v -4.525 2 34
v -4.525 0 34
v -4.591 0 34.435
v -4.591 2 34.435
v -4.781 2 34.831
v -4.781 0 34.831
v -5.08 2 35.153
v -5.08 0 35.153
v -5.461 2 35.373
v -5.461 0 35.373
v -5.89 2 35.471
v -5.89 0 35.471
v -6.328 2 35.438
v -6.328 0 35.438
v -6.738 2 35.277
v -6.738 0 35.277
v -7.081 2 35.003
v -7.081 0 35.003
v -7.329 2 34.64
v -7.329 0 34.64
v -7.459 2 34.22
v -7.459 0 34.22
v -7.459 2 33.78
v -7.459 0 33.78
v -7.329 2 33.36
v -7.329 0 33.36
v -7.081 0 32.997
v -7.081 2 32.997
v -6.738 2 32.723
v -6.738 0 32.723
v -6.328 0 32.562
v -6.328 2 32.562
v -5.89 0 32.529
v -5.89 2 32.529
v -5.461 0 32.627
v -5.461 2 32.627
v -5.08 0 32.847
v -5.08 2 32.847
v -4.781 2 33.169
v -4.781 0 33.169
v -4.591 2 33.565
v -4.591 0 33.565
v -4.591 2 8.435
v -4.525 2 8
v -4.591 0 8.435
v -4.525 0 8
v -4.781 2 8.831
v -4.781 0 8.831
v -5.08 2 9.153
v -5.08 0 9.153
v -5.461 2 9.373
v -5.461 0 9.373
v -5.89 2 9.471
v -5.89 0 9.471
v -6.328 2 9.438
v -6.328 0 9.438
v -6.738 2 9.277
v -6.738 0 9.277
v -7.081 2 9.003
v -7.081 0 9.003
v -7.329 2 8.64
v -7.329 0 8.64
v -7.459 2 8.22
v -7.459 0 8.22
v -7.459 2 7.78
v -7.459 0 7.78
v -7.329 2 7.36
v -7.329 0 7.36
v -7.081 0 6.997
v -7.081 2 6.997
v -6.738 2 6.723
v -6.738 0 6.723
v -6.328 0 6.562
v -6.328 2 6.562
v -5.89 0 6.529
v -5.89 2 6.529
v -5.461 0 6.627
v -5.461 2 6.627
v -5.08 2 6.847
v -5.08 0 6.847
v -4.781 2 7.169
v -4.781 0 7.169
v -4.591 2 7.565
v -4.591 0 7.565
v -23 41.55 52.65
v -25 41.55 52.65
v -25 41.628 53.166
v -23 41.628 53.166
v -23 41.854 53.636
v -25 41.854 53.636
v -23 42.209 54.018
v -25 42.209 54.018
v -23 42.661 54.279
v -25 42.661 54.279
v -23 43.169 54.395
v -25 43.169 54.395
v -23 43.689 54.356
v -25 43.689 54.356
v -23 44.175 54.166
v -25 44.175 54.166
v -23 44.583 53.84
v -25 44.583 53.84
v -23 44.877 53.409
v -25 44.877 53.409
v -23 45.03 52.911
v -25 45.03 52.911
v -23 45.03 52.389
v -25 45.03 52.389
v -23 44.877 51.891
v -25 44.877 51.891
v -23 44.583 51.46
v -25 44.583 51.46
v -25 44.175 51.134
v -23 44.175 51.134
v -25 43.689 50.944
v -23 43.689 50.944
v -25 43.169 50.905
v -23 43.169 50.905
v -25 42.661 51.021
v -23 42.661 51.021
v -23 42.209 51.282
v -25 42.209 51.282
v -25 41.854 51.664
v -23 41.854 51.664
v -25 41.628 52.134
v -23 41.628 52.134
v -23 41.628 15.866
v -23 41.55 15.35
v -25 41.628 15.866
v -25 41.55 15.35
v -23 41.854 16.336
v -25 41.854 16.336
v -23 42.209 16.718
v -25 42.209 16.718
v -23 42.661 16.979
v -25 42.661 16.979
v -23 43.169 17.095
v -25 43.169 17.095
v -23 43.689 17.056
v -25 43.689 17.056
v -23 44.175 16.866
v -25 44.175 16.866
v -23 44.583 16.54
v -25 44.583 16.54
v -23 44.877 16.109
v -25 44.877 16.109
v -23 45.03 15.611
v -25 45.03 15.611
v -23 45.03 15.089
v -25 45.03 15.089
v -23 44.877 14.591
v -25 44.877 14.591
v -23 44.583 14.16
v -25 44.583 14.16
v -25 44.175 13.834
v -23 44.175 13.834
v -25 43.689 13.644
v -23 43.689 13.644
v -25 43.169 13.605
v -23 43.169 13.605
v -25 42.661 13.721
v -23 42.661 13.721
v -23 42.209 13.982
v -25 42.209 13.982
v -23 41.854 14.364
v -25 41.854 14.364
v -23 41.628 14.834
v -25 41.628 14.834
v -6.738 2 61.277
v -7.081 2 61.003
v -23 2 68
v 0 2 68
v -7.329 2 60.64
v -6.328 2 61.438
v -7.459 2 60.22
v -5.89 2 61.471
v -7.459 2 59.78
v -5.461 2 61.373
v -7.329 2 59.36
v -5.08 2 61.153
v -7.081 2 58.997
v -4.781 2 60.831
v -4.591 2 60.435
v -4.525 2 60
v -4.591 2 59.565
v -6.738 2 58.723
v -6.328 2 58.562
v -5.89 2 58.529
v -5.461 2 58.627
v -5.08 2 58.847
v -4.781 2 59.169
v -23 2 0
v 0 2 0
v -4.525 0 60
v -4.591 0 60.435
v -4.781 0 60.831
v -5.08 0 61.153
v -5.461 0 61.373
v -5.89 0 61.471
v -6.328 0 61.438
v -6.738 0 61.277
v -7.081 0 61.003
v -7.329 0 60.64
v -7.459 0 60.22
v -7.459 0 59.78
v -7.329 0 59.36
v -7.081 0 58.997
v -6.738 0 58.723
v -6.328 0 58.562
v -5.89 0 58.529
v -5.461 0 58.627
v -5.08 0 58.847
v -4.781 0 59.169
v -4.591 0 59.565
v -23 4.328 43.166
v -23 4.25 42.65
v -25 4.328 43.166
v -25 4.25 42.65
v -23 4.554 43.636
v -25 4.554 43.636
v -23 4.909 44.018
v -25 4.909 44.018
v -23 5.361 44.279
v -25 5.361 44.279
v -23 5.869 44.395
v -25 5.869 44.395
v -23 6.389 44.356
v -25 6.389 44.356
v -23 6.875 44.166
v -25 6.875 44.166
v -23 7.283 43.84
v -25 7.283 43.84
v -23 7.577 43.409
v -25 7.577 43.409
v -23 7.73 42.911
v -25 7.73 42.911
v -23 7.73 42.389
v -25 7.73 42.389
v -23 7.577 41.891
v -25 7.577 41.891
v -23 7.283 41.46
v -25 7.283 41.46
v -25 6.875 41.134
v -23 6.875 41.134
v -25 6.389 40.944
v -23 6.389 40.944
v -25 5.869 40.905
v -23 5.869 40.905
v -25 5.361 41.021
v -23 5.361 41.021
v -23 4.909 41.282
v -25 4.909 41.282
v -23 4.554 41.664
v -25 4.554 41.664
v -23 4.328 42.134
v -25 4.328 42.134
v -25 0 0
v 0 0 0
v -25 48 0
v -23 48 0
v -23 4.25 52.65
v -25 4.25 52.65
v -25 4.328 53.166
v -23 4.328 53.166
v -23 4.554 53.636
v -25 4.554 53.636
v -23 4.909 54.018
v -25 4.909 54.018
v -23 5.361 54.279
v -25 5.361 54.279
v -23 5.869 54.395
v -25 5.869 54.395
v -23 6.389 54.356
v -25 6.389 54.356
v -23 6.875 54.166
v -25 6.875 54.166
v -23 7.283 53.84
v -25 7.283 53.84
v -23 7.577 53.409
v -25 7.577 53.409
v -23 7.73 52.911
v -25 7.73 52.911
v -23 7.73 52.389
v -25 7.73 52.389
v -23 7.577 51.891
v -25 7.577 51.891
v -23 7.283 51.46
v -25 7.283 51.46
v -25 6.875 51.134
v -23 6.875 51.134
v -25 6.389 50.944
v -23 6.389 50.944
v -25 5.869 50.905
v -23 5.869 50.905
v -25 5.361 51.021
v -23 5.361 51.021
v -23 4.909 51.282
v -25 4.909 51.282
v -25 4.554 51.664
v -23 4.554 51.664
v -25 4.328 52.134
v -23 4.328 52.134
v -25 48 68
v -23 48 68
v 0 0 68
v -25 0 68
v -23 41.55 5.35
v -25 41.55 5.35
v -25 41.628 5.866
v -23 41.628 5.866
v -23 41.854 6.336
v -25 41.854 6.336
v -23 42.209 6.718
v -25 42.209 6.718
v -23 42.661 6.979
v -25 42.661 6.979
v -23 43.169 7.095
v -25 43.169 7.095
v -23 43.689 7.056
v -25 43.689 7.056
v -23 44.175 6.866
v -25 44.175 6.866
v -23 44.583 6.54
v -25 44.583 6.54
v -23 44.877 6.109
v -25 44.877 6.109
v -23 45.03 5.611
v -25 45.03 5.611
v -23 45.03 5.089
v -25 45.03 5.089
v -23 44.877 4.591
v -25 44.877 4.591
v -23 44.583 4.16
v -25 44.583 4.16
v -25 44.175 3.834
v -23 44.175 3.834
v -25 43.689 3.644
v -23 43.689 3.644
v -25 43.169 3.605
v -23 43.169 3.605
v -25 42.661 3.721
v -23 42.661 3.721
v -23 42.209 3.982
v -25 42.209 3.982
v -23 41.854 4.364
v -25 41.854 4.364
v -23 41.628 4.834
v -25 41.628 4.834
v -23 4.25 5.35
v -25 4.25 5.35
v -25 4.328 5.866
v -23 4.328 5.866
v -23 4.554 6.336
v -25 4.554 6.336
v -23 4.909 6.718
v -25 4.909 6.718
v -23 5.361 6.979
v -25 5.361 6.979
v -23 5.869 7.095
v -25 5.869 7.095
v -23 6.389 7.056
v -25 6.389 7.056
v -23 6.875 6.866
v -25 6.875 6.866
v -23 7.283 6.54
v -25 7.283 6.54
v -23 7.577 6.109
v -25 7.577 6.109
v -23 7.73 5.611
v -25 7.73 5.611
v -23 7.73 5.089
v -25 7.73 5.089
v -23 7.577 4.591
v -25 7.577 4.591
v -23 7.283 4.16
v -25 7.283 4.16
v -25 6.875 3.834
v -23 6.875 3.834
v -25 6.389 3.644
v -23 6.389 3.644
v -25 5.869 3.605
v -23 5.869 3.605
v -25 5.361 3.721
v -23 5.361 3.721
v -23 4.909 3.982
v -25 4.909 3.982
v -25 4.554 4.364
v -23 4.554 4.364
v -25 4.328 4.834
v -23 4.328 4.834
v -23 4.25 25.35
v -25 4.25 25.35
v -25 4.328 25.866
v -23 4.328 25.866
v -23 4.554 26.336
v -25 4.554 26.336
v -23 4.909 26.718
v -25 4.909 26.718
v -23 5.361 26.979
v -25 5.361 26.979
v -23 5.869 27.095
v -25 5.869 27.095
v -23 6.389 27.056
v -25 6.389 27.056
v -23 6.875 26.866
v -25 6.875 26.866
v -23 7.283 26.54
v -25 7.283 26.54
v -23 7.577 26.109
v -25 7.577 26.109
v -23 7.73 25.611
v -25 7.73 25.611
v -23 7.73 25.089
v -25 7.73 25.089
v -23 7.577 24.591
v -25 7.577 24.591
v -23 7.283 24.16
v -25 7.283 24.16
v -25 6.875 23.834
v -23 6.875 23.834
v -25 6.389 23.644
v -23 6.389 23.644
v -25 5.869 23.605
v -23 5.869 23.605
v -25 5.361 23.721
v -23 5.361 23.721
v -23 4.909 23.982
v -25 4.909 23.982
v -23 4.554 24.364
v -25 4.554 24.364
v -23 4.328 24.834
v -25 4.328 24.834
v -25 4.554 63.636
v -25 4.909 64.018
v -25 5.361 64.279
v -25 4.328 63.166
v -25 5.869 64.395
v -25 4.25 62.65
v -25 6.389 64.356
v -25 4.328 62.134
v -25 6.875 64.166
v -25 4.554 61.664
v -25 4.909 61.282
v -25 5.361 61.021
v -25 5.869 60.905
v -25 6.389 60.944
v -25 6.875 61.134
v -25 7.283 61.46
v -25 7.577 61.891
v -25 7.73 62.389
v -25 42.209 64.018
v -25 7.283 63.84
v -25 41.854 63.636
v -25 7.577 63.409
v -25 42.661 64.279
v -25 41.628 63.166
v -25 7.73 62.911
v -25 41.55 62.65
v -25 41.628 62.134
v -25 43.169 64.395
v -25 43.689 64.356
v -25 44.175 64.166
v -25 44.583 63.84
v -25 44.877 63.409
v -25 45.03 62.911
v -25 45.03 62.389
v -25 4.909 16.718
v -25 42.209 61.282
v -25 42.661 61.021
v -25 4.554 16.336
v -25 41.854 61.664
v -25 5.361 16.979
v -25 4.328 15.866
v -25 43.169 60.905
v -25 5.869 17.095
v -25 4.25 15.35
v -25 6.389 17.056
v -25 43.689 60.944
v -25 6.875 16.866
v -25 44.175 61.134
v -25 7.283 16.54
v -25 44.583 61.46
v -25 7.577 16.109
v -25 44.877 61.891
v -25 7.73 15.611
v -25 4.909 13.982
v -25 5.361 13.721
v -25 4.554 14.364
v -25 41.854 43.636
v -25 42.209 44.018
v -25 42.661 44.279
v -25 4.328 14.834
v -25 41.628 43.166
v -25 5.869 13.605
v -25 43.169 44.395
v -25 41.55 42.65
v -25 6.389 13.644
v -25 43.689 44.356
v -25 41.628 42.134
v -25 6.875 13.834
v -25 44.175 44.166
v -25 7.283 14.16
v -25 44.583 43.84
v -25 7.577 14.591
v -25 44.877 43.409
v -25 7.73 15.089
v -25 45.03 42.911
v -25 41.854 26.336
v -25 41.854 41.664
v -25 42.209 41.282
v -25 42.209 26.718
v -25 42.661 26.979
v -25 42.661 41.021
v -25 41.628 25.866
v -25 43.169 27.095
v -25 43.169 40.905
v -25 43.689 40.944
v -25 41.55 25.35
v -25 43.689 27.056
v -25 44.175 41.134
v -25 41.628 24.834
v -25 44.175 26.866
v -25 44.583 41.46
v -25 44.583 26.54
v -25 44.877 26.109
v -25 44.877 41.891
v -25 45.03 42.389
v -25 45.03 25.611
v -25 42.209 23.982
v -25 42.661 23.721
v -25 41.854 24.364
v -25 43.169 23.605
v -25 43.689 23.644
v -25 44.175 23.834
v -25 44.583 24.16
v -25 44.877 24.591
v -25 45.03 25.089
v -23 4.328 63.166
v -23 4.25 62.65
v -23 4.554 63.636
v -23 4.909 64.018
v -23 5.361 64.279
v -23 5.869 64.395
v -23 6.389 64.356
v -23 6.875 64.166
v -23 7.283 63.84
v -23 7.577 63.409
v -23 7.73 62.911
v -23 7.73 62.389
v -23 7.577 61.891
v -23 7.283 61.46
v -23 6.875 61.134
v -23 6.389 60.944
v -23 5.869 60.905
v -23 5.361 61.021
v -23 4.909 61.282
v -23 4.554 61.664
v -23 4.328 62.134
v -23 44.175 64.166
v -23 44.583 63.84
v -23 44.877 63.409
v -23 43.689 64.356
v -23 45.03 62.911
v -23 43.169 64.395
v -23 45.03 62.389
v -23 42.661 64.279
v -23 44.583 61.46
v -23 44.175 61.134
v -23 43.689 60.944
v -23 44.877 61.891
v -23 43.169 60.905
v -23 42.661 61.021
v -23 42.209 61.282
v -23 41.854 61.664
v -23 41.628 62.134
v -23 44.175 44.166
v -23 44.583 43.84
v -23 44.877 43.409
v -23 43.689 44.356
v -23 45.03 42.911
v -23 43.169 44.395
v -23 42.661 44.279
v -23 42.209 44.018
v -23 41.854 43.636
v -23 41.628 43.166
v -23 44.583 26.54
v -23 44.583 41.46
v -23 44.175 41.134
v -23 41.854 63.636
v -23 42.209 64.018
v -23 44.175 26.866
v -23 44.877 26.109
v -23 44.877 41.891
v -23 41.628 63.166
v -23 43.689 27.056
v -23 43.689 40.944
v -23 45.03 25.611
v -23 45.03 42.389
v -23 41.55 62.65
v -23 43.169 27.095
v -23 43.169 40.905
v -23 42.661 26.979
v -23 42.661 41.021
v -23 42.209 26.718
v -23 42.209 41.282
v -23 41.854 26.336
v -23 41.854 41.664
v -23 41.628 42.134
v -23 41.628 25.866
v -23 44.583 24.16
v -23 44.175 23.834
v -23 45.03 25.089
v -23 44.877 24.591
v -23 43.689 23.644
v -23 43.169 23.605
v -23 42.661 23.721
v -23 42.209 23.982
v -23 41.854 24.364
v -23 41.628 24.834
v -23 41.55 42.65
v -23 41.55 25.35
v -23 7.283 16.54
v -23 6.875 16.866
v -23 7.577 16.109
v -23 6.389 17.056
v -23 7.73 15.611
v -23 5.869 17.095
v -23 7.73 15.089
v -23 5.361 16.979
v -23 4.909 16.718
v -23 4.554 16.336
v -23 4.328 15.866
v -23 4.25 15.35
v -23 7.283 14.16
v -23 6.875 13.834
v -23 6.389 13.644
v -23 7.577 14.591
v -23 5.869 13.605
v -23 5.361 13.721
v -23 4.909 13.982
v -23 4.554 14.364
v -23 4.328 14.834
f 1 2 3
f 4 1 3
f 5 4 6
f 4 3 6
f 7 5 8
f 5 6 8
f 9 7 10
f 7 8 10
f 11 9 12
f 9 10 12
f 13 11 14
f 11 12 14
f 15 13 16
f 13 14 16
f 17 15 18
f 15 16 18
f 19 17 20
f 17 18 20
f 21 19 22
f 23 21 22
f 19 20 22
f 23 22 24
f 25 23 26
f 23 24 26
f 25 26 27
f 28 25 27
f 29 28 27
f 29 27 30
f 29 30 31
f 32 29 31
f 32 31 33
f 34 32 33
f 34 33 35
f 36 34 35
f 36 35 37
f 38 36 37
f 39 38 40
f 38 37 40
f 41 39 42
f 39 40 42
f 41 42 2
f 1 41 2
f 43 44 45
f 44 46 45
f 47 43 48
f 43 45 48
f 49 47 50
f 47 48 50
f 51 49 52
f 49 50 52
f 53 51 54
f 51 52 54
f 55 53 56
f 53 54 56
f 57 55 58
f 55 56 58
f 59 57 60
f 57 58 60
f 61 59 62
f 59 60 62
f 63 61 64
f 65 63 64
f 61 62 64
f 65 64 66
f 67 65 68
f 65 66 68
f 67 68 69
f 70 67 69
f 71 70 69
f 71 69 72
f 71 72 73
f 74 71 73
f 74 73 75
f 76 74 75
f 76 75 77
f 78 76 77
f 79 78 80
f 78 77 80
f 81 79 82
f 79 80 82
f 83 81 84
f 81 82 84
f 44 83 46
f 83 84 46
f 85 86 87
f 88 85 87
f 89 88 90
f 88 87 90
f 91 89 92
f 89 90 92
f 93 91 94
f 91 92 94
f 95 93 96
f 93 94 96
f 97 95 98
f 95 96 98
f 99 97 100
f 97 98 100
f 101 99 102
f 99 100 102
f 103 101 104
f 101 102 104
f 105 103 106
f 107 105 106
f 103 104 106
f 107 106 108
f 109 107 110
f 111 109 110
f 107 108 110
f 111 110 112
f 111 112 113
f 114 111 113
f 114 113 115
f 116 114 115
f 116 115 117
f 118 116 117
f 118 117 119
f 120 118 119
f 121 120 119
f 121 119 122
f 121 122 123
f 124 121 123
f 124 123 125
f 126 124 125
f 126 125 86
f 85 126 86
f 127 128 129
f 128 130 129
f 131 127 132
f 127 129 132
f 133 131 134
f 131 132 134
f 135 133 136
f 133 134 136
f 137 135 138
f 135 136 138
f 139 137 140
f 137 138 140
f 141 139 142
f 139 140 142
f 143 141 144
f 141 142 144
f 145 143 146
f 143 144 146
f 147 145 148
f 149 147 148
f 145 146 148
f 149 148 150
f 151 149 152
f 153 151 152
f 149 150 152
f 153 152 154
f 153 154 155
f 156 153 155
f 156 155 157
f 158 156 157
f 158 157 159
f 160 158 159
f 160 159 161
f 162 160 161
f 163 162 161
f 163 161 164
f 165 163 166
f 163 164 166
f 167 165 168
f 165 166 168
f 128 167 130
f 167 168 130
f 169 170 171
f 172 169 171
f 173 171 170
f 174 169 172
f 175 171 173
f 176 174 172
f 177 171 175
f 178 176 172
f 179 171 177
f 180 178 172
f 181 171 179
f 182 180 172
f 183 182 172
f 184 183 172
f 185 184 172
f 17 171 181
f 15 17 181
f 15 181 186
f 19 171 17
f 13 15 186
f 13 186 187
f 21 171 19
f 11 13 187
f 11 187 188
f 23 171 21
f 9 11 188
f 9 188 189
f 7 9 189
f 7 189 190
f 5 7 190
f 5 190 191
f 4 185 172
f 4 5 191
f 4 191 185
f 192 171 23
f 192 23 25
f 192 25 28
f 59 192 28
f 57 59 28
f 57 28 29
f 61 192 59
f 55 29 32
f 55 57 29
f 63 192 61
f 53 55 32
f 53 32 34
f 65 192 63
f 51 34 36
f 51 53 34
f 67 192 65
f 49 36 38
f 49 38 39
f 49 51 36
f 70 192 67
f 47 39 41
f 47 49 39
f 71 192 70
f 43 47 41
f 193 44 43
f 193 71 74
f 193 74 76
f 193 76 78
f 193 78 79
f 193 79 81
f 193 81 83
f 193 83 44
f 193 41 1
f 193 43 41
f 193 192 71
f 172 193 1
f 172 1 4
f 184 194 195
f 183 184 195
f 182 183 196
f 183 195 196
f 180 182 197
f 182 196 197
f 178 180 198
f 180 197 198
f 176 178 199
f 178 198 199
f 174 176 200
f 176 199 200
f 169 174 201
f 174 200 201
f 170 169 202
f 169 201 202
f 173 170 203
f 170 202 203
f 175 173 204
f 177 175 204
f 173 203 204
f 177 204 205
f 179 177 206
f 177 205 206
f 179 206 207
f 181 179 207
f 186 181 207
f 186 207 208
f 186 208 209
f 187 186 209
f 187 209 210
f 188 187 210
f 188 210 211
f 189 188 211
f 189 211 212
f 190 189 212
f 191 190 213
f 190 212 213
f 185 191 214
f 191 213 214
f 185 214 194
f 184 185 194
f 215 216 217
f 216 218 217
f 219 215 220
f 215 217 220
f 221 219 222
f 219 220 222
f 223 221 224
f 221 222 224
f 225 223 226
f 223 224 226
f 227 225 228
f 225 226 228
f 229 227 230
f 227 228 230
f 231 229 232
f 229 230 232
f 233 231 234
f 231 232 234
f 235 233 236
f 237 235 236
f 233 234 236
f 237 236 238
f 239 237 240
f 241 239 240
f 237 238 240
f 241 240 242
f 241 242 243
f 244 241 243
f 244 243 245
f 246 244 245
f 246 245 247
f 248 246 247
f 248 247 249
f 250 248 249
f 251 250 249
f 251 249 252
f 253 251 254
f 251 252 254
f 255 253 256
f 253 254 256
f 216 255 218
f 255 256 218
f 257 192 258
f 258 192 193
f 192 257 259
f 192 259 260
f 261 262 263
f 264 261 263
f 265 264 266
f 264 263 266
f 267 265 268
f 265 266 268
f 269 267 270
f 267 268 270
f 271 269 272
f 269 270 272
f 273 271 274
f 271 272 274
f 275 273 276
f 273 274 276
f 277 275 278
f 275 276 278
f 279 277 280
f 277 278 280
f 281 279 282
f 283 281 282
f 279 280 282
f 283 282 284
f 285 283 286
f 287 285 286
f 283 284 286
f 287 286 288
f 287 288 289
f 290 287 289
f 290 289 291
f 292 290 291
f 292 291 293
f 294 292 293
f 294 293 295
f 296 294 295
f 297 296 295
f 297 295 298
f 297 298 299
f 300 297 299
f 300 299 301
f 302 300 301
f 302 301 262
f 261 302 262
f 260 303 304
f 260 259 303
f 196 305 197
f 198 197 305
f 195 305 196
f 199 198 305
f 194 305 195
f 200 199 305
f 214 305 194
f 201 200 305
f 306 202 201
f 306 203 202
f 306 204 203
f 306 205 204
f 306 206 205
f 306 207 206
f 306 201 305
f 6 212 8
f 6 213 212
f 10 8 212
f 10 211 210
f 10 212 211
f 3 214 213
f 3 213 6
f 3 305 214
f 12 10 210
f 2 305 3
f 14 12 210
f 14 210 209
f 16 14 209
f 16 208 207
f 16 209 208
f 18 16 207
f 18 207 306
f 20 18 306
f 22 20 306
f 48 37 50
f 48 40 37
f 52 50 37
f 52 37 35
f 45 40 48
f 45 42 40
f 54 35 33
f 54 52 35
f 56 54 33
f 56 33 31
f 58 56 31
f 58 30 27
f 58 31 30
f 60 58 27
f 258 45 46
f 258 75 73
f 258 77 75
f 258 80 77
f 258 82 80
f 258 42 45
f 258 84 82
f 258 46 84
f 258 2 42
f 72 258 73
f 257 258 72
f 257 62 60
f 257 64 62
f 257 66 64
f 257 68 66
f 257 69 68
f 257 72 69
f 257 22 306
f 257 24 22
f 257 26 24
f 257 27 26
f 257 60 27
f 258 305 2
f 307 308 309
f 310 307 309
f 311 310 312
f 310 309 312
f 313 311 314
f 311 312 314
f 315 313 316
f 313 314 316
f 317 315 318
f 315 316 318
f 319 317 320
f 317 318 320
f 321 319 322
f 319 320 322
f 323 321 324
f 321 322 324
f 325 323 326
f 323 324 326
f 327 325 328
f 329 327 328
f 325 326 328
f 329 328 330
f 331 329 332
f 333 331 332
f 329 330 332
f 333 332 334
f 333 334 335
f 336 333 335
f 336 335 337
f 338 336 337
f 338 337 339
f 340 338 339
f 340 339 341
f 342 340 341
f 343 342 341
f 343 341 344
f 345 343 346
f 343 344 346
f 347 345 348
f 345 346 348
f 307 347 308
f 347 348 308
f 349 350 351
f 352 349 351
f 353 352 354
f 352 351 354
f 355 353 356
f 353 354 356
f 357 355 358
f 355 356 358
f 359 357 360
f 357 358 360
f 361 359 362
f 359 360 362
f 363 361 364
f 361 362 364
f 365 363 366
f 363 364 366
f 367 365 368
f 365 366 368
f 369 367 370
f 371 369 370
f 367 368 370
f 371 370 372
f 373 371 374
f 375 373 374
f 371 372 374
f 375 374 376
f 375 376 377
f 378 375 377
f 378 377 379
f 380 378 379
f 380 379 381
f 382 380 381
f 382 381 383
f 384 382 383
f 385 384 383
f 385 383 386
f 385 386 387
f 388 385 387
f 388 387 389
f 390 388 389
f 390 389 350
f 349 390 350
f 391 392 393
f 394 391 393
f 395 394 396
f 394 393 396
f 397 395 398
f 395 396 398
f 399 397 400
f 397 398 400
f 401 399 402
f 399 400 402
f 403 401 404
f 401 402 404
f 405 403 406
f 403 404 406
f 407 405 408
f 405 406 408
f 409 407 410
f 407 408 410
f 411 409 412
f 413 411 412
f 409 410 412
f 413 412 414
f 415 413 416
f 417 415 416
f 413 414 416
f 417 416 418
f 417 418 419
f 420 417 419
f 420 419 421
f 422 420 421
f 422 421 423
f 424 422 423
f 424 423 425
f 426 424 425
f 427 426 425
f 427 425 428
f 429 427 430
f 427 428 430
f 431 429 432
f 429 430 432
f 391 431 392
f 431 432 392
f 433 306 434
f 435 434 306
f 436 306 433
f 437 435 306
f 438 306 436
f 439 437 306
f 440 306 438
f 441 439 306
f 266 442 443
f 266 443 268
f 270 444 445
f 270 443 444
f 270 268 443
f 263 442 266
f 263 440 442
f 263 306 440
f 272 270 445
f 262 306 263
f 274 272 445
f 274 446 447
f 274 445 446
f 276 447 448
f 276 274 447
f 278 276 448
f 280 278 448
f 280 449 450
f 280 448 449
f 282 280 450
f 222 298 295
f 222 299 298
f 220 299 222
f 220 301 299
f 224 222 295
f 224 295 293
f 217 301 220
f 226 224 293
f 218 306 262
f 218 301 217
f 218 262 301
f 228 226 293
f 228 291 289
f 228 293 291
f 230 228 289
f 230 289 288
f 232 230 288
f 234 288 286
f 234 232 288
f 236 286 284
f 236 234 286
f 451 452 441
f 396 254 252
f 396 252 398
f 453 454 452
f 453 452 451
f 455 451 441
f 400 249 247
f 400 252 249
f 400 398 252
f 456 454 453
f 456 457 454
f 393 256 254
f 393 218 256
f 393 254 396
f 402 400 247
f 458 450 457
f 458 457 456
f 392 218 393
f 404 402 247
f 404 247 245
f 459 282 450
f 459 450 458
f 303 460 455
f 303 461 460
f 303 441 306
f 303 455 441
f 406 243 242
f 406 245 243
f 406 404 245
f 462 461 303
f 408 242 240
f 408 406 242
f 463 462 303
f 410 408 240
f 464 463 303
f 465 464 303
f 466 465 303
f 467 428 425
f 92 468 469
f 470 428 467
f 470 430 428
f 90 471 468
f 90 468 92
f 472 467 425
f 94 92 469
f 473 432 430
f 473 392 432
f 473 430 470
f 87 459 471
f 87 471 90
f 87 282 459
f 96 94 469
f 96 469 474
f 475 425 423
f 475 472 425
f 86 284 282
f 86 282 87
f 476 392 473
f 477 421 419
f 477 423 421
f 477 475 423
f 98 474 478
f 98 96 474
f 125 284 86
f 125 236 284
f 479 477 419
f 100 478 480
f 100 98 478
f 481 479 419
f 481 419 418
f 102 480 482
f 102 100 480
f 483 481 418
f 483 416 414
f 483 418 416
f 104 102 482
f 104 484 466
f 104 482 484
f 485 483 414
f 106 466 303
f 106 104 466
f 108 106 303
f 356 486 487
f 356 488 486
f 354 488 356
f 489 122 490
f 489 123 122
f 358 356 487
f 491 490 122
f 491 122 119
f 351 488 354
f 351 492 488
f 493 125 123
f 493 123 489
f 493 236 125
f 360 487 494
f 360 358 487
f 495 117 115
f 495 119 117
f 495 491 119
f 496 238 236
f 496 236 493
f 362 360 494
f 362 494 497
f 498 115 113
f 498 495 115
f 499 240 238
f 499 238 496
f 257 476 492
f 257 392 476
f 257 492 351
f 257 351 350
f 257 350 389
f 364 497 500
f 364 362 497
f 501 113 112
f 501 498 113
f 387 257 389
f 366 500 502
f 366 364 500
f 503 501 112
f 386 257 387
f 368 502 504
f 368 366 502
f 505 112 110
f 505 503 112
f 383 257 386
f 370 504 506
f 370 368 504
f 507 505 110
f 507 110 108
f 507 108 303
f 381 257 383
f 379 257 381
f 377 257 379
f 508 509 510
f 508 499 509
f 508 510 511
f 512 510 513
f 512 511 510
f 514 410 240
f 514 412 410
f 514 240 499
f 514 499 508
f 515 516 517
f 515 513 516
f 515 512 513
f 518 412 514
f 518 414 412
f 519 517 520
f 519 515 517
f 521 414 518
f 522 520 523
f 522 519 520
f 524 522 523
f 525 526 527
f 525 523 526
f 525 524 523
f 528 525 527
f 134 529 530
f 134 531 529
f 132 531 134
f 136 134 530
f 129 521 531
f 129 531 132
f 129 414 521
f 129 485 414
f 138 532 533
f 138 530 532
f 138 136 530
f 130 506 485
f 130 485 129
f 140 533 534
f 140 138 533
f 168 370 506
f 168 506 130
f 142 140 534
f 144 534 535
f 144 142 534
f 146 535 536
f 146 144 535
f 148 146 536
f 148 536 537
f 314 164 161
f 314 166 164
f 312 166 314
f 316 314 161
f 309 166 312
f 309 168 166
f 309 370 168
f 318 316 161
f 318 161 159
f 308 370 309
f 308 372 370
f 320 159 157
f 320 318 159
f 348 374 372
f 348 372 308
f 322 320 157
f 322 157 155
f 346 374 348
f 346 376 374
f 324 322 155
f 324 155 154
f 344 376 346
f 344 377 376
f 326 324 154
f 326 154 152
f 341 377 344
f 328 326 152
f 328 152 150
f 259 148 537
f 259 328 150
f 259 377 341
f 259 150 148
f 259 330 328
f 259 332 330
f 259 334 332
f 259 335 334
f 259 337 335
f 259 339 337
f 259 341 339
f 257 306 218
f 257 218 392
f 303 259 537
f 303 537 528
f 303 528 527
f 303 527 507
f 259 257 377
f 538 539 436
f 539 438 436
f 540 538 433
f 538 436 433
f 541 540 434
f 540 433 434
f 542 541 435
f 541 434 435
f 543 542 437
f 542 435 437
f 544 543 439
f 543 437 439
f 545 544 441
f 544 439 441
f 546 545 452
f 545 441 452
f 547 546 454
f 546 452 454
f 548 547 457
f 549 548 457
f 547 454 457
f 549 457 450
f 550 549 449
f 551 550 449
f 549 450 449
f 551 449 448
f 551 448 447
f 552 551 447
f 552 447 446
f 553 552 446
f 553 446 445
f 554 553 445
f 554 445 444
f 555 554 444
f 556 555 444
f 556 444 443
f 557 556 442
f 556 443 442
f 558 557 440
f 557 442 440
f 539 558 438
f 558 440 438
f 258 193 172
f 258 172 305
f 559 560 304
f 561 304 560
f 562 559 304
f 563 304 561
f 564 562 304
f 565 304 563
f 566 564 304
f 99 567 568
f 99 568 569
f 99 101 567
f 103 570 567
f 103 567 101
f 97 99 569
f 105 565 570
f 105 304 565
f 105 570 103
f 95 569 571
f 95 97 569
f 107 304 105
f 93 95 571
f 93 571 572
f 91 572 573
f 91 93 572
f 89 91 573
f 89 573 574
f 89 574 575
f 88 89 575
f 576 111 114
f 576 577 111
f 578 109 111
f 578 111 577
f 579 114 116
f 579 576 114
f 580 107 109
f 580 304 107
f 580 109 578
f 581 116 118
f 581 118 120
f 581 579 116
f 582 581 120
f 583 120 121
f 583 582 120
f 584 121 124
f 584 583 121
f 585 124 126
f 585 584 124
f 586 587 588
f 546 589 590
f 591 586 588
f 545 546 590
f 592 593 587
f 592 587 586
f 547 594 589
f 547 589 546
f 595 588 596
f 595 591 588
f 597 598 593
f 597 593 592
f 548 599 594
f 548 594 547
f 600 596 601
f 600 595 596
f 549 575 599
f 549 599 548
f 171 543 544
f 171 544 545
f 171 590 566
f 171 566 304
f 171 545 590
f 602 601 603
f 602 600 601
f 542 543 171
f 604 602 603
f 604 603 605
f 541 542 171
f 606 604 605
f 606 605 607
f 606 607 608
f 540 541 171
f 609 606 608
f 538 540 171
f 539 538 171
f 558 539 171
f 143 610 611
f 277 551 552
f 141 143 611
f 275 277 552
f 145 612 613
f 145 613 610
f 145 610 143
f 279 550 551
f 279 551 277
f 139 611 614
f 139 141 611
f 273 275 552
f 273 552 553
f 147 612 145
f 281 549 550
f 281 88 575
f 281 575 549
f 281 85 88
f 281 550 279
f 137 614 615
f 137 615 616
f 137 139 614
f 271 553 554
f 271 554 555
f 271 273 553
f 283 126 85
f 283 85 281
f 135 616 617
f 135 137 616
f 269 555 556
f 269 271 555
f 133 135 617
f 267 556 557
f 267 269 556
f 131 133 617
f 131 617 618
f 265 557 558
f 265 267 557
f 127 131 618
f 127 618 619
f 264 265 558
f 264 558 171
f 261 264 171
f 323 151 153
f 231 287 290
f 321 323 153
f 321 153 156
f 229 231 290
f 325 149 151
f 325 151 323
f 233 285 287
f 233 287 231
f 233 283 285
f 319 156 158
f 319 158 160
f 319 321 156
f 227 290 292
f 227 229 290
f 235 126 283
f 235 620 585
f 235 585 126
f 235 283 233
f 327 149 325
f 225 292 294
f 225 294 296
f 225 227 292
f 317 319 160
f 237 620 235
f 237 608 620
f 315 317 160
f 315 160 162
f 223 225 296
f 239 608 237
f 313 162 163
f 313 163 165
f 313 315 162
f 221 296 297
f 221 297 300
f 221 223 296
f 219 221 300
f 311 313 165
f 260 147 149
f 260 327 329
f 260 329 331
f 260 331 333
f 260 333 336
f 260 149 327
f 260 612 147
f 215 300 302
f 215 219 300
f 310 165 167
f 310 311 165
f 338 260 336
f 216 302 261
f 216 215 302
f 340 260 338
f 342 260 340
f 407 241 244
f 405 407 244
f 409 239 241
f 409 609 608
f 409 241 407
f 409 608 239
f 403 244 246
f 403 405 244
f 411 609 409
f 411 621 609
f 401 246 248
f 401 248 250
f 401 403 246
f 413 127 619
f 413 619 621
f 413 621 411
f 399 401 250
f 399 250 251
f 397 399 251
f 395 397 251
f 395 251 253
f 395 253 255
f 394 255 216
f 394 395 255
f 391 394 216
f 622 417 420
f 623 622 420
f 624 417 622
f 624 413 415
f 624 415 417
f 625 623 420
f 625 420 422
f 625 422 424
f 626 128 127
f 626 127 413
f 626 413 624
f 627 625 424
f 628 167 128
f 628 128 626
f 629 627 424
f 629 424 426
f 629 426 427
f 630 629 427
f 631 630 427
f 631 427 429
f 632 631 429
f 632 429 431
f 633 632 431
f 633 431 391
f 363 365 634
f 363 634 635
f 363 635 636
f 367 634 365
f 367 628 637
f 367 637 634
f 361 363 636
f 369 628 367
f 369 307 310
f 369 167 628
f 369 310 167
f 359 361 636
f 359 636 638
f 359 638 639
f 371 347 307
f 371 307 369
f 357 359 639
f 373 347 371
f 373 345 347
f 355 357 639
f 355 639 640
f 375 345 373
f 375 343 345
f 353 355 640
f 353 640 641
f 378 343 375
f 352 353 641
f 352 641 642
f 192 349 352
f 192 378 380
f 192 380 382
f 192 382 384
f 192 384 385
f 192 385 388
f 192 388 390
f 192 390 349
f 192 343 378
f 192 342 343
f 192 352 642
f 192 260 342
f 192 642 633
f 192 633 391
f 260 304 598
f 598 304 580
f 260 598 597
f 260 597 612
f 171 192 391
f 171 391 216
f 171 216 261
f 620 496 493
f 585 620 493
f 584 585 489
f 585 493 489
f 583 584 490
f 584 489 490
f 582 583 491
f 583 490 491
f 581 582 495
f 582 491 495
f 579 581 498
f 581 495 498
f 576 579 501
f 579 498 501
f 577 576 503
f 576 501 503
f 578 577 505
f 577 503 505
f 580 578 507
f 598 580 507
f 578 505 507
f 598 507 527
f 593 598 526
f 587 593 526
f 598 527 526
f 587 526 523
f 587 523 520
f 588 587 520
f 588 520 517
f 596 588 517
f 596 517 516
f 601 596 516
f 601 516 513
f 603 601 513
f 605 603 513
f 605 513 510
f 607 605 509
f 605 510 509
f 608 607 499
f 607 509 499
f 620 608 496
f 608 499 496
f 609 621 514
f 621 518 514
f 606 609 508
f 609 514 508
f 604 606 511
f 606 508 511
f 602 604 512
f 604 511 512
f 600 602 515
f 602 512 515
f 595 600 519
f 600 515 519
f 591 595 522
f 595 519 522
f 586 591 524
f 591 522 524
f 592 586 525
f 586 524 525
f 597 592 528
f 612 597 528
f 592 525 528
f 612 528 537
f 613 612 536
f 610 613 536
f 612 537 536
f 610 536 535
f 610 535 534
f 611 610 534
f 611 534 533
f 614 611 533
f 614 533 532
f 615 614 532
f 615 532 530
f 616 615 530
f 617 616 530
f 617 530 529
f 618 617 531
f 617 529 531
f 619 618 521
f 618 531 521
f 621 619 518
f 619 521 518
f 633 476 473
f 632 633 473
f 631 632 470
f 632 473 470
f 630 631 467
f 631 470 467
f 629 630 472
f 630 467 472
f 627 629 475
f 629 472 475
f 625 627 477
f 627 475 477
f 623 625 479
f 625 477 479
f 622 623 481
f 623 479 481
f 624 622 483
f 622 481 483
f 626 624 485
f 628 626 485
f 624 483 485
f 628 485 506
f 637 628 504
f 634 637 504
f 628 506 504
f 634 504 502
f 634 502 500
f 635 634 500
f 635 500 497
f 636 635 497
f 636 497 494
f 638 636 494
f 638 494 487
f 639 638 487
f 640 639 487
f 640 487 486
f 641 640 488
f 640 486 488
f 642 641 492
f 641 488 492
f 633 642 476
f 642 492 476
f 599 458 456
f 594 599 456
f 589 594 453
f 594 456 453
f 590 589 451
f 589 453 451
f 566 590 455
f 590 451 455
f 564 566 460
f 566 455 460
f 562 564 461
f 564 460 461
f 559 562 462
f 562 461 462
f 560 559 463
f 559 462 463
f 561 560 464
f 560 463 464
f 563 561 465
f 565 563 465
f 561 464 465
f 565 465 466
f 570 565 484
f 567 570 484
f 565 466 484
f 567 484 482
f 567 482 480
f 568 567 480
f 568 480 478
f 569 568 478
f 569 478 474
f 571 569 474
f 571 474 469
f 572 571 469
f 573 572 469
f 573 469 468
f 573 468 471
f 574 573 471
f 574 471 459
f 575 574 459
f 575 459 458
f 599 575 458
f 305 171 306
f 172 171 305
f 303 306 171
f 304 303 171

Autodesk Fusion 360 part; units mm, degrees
sketch "Sketch1" plane through (0, 0, 0) normal (0, 0, 1) x (1, 0, 0)
  line L0 (0, 0) -> (-25, 0)
  line L1 (-25, 0) -> (-25, 48)
  line L2 (-25, 48) -> (-23, 48)
  line L3 (-23, 48) -> (-23, 2)
  line L4 (-23, 2) -> (0, 2)
  line L5 (0, 2) -> (0, 0)
  dimension "d1" = 2
  dimension "d2" = 23
  dimension "d3" = 25
  dimension "d35" = 2
extrude "Extrude1" add sketch "Sketch1" along normal blind 68
sketch "Sketch2" plane through (-25, 0, 0) normal (-1, 0, 0) x (0, -1, 0)
  line L0 (-48, 0) -> (0, 0)
  line L1 (0, 0) -> (0, 68)
  line L2 (0, 68) -> (-48, 68)
  line L3 (-48, 68) -> (-48, 0)
  circle A0 centre (-6, 52.65) radius 1.75
  dimension "d8" = 3.5
  dimension "d9" = 15.35
  dimension "d10" = 6
extrude "Extrude2" cut sketch "Sketch2" against normal blind 15 contours A0
pattern_linear "R-Pattern1" count 1 spacing 0 along (0, 1, 0) count 2 spacing 37.3 along (0, 0, -1) of "Extrude2"
sketch "Sketch3" plane through (-25, 0, 0) normal (-1, 0, 0) x (0, -1, 0)
  circle A0 centre (-6, 15.35) radius 1.75
  circle A1 centre (-6, 52.65) radius 1.75
  line L0 (-48, 0) -> (0, 0)
  line L1 (0, 0) -> (0, 68)
  line L2 (0, 68) -> (-48, 68)
  line L3 (-48, 68) -> (-48, 0)
  circle A2 centre (-43.3, 52.65) radius 1.75
  dimension "d17" = 3.5
  dimension "d18" = 15.35
  dimension "d19" = 37.3
extrude "Extrude3" cut sketch "Sketch3" against normal blind 10 contours A2
pattern_linear "R-Pattern2" count 2 spacing 37.3 along (0, 0, -1) of "Extrude3"
sketch "Sketch4" plane through (0, 0, 0) normal (0, -1, 0) x (1, 0, 0)
  line L0 (-25, 0) -> (0, 0)
  line L1 (0, 0) -> (0, 68)
  line L2 (0, 68) -> (-25, 68)
  line L3 (-25, 68) -> (-25, 0)
  circle A0 centre (-6, 60) radius 1.475
  dimension "d26" = 2.95
  dimension "d27" = 8
  dimension "d28" = 6
extrude "Extrude4" cut sketch "Sketch4" against normal blind 6 contours A0
pattern_linear "R-Pattern3" count 3 spacing 26 along (0, 0, -1) of "Extrude4"
pattern_linear "R-Pattern4" count 2 spacing 10 along (0, 0, 1) of "R-Pattern2", "R-Pattern1", "Extrude3", "Extrude2"
pattern_linear "R-Pattern5" count 2 spacing 10 along (0, 0, -1) of "Extrude3", "Extrude2", "R-Pattern2", "R-Pattern1"
